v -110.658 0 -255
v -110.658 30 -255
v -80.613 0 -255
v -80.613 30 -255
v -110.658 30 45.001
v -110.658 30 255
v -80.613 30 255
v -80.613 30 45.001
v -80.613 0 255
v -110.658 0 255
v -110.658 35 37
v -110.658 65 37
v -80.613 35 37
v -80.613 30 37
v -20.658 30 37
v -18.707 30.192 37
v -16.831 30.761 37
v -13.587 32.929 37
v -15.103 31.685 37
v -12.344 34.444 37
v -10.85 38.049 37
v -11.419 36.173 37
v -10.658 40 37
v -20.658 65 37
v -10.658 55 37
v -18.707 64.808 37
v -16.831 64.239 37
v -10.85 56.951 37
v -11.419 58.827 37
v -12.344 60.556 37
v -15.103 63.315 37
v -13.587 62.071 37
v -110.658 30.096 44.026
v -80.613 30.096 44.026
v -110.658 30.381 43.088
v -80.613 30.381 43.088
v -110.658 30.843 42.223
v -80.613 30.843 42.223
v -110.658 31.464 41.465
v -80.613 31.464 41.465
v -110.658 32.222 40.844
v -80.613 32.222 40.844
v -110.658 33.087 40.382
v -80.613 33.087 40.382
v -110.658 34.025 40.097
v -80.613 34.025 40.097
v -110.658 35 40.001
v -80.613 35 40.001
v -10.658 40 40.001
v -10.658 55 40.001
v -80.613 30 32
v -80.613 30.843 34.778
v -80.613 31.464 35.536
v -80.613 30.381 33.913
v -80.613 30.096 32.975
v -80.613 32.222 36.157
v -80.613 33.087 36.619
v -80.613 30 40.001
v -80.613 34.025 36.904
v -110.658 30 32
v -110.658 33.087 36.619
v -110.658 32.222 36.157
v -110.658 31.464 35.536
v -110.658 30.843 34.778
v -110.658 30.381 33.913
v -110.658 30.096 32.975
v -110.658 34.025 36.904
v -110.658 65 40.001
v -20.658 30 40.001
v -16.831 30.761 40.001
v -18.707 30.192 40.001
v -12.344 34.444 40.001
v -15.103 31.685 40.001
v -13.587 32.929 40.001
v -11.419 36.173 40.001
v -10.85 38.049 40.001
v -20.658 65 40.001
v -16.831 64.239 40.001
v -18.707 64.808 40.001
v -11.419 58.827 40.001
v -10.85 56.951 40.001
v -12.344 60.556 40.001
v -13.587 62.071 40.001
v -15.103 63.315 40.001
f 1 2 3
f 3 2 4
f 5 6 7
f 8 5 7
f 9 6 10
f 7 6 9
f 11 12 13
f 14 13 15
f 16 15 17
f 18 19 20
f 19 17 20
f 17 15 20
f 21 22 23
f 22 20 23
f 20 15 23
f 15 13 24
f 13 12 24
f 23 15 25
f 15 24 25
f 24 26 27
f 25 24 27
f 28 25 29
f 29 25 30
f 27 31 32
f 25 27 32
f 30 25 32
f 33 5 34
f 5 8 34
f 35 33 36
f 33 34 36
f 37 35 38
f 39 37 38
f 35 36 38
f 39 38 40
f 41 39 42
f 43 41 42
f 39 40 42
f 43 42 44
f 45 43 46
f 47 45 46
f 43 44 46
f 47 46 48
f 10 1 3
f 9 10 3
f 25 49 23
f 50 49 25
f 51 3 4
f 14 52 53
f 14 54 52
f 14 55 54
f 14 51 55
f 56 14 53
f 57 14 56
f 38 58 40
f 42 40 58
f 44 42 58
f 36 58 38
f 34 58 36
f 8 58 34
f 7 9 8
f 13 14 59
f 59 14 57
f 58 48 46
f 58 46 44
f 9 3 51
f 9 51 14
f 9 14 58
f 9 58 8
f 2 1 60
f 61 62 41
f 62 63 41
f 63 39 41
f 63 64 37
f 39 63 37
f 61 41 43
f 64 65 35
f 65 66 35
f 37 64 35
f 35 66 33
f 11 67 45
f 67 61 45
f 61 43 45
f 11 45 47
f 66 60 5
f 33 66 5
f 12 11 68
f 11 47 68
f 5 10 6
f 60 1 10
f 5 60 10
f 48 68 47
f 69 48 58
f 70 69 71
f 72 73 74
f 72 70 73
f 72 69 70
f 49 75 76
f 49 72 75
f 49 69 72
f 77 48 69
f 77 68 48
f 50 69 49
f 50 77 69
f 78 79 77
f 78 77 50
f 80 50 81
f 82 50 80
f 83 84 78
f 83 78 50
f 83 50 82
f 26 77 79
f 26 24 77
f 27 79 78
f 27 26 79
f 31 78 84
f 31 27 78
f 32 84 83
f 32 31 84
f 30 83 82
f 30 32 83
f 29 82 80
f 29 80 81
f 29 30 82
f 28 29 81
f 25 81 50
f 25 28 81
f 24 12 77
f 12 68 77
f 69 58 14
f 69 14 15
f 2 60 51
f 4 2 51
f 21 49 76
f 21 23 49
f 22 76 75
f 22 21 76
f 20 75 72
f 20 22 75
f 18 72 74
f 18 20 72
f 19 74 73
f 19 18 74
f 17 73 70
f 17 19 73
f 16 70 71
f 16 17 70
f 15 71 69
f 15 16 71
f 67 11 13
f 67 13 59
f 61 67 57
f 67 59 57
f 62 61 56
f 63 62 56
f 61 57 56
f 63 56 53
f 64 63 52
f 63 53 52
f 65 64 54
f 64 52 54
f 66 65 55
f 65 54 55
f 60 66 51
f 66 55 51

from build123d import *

# Parameters (mm, degrees)
ESBO_O2_W                     = 30.045415171
ESBO_O2_H                     = 30
RESSALTO_EXTRUS_O1_DEPTH      = 255
ESBO_O4_W                     = 100
ESBO_O4_H                     = 35
RESSALTO_EXTRUS_O2_DEPTH      = 0.001
RESSALTO_EXTRUS_O2_DEPTH_BACK = 3
FILETE1_R                     = 5
FILETE2_R                     = 10


with BuildPart() as part:
    # Esboço2 → Ressalto-extrusão1 (new body, symmetric)
    with BuildSketch(Plane.XY):
        with Locations((-95.635568537, 15)):
            Rectangle(ESBO_O2_W, ESBO_O2_H)
    extrude(amount=RESSALTO_EXTRUS_O1_DEPTH, both=True)

    # Esboço4 → Ressalto-extrusão2 (add, two sides)
    with BuildSketch(Plane.XY.offset(40)) as ressalto_extrus_o2_sk:
        with Locations((-60.658276122, 47.5)):
            Rectangle(ESBO_O4_W, ESBO_O4_H)
    extrude(amount=RESSALTO_EXTRUS_O2_DEPTH)
    extrude(ressalto_extrus_o2_sk.sketch, amount=-RESSALTO_EXTRUS_O2_DEPTH_BACK)

    # Filete1
    filete1_edges = [part.edges().sort_by_distance(p)[0] for p in [
        (-95.635568536, 30, 37),
        (-95.635568536, 30, 40.001),
    ]]
    fillet(filete1_edges, radius=FILETE1_R)

    # Filete2
    filete2_edges = [part.edges().sort_by_distance(p)[0] for p in [
        (-10.658276122, 65, 38.5005),
        (-10.658276122, 30, 38.5005),
    ]]
    fillet(filete2_edges, radius=FILETE2_R)


solid = part.part
